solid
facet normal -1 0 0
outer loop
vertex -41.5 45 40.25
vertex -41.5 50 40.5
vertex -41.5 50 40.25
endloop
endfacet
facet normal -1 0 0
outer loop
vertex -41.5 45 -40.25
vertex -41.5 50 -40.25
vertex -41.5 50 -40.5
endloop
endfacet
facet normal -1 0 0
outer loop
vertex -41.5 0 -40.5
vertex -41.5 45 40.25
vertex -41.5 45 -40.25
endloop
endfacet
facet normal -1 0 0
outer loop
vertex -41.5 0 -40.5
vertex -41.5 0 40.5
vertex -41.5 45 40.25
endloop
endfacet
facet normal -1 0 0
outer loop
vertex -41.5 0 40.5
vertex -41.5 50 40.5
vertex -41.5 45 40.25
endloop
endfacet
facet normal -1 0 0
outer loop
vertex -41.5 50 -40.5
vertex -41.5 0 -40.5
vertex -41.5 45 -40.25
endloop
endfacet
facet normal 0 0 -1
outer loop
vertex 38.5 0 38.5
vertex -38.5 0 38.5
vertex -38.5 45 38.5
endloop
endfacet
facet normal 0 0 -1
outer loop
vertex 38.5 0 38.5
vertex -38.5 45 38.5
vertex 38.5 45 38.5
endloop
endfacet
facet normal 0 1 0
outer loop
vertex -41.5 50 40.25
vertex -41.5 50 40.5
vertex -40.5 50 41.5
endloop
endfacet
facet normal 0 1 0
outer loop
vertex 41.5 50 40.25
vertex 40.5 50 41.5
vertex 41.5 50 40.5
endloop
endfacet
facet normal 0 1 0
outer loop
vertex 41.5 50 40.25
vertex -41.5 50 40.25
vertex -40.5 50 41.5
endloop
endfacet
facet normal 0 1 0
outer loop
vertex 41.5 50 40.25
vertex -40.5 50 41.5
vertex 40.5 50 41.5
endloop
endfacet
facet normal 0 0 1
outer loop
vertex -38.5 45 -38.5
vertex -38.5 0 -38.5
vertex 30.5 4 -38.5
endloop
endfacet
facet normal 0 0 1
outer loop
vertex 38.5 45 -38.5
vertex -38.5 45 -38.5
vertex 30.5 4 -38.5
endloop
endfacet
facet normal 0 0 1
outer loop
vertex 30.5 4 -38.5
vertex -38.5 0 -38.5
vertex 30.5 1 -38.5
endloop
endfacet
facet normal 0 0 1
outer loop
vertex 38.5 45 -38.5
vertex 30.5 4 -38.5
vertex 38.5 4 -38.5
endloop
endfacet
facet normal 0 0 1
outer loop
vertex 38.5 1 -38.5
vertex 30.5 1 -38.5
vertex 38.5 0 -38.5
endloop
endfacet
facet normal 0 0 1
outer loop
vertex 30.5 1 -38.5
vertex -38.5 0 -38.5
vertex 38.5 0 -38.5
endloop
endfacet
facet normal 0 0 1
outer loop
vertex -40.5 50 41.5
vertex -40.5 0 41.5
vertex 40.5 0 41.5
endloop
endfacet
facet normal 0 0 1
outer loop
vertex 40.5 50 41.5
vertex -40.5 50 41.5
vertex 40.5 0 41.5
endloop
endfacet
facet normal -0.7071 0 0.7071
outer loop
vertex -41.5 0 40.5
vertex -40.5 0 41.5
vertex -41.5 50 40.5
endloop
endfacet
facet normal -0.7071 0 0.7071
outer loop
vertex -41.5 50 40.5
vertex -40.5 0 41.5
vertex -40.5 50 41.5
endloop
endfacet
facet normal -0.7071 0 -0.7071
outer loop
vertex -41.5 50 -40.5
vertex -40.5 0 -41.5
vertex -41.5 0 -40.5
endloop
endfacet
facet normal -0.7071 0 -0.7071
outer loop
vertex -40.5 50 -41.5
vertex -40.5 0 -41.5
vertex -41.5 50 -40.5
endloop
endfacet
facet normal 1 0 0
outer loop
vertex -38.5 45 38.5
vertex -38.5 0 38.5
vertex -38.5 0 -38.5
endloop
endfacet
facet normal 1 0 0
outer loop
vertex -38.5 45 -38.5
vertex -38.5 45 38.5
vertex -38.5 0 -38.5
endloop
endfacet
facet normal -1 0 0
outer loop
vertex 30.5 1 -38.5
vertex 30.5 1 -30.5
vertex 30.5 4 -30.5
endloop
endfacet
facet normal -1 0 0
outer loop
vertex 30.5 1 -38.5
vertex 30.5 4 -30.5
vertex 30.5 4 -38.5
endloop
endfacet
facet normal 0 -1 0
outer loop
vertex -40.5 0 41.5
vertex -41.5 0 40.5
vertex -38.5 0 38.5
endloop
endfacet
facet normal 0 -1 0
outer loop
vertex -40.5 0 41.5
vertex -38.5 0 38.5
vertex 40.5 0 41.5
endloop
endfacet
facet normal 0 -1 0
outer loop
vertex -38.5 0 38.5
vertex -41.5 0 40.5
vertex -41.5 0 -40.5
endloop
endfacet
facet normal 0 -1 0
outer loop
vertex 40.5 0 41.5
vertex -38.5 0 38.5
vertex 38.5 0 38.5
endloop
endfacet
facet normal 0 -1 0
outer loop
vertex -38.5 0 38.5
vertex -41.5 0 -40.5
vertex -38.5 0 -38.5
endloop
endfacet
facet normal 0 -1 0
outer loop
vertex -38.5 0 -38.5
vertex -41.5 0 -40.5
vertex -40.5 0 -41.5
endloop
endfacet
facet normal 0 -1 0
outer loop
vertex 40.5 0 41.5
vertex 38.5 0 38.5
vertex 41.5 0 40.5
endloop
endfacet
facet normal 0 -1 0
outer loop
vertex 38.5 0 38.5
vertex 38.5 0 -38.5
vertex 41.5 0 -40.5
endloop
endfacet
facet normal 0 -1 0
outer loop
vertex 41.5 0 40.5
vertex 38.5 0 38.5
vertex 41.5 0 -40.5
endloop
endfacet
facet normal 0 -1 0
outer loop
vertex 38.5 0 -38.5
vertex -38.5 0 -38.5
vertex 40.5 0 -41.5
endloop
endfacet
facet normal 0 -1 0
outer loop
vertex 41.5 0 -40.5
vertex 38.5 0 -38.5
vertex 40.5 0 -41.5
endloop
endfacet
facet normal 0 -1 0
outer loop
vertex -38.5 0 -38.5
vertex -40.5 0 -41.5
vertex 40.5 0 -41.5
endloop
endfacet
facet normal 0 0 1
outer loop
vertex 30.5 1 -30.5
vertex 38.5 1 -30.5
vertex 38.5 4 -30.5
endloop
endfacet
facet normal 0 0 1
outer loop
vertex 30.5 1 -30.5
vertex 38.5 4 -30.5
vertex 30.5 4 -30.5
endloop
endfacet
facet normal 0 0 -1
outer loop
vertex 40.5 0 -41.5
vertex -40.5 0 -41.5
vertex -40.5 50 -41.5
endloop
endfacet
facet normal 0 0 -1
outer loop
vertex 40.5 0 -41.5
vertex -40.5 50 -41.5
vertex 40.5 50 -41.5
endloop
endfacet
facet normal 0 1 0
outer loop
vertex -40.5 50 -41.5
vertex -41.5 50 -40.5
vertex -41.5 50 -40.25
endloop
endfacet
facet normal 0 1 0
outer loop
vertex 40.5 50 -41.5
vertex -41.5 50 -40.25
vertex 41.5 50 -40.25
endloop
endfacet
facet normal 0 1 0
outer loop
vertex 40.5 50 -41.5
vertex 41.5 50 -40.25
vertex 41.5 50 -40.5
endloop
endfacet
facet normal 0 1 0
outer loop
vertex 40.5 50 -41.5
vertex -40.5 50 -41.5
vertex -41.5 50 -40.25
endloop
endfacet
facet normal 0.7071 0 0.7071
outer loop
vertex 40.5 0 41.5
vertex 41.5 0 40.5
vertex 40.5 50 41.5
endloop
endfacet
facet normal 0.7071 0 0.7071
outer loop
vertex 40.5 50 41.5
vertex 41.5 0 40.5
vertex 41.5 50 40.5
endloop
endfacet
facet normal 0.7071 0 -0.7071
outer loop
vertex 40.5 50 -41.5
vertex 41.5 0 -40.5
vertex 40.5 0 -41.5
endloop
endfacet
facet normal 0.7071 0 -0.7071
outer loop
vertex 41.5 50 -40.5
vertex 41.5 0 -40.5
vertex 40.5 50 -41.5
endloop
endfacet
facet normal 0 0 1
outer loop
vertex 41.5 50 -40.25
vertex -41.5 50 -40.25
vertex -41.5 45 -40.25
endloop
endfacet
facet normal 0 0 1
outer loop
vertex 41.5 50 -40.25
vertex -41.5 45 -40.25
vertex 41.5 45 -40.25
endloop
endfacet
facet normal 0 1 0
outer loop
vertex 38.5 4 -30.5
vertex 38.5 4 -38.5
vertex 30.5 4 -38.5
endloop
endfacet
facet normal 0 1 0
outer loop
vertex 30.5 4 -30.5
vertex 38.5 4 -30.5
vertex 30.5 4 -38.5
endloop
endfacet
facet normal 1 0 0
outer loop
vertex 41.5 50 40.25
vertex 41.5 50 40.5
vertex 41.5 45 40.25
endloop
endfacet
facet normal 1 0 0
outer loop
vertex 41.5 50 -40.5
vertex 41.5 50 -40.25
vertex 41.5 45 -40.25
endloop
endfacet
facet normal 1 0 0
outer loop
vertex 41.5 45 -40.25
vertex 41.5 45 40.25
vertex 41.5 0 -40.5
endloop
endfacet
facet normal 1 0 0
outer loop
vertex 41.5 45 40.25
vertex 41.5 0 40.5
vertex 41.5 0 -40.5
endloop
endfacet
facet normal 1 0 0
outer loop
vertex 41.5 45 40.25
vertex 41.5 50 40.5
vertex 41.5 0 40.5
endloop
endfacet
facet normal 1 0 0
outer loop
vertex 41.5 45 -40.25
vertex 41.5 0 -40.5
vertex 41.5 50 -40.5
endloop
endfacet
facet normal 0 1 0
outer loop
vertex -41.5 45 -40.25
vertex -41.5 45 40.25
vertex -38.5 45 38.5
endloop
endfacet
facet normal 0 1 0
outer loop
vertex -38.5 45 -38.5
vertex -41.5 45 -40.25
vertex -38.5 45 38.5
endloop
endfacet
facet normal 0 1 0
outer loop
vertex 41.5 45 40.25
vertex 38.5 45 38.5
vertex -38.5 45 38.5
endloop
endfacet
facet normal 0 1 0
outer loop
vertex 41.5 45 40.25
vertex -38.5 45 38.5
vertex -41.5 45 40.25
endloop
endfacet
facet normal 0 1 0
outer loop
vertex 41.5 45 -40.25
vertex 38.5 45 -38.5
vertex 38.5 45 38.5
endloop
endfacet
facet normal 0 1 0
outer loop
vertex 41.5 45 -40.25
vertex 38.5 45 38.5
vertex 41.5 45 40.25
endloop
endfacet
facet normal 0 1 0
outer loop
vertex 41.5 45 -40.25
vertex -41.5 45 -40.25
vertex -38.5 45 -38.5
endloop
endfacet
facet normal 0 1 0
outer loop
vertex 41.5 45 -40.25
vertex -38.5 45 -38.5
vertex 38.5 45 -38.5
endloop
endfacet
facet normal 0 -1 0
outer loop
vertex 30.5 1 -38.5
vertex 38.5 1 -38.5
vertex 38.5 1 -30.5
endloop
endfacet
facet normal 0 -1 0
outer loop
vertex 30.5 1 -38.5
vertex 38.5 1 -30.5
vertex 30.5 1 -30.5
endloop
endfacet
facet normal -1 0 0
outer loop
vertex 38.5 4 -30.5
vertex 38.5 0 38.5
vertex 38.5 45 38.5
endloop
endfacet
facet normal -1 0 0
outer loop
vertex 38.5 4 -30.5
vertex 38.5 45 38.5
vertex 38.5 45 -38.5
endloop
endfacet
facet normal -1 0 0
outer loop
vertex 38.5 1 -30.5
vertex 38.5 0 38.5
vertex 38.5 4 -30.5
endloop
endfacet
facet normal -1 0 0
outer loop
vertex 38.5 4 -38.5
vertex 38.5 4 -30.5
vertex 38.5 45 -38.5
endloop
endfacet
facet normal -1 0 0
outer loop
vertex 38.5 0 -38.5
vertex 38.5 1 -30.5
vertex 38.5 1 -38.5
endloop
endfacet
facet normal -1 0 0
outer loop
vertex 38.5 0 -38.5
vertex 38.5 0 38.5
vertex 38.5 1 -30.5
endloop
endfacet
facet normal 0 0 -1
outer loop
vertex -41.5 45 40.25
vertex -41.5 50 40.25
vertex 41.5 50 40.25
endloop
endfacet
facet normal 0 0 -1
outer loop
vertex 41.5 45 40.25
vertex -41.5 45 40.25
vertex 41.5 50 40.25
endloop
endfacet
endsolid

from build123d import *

# Parameters (mm, degrees)
SKETCH1_W           = 83
SKETCH1_H           = 83
SKETCH1_W_2         = 77
SKETCH1_H_2         = 77
BOSS_EXTRUDE1_DEPTH = 50
SKETCH2_W           = 100.5
SKETCH2_H           = 80.5
CUT_EXTRUDE1_DEPTH  = 5
CHAMFER1_SIZE       = 1
SKETCH3_W           = 8
SKETCH3_H           = 8
BOSS_EXTRUDE2_DEPTH = 3


with BuildPart() as part:
    # Sketch1 → Boss-Extrude1 (new body)
    with BuildSketch(Plane(origin=(0, 0, 0), x_dir=(1, 0, 0), z_dir=(0, 1, 0))):
        Rectangle(SKETCH1_W, SKETCH1_H)
        Rectangle(SKETCH1_W_2, SKETCH1_H_2, mode=Mode.SUBTRACT)
    extrude(amount=BOSS_EXTRUDE1_DEPTH)

    # Sketch2 → Cut-Extrude1 (cut)
    with BuildSketch(Plane(origin=(0, 50, 0), x_dir=(1, 0, 0), z_dir=(0, 1, 0))):
        Rectangle(SKETCH2_W, SKETCH2_H)
    extrude(amount=-CUT_EXTRUDE1_DEPTH, mode=Mode.SUBTRACT)

    # Chamfer1
    chamfer1_edges = [part.edges().sort_by_distance(p)[0] for p in [
        (-41.5, 25, -41.5),
        (41.5, 25, -41.5),
        (41.5, 25, 41.5),
        (-41.5, 25, 41.5),
    ]]
    chamfer(chamfer1_edges, length=CHAMFER1_SIZE)

    # Sketch3 → Boss-Extrude2 (add)
    with BuildSketch(Plane(origin=(0, 1, 0), x_dir=(-1, 0, 0), z_dir=(0, -1, 0))):
        with Locations((-34.5, 34.5)):
            Rectangle(SKETCH3_W, SKETCH3_H)
    extrude(amount=-BOSS_EXTRUDE2_DEPTH)


solid = part.part
